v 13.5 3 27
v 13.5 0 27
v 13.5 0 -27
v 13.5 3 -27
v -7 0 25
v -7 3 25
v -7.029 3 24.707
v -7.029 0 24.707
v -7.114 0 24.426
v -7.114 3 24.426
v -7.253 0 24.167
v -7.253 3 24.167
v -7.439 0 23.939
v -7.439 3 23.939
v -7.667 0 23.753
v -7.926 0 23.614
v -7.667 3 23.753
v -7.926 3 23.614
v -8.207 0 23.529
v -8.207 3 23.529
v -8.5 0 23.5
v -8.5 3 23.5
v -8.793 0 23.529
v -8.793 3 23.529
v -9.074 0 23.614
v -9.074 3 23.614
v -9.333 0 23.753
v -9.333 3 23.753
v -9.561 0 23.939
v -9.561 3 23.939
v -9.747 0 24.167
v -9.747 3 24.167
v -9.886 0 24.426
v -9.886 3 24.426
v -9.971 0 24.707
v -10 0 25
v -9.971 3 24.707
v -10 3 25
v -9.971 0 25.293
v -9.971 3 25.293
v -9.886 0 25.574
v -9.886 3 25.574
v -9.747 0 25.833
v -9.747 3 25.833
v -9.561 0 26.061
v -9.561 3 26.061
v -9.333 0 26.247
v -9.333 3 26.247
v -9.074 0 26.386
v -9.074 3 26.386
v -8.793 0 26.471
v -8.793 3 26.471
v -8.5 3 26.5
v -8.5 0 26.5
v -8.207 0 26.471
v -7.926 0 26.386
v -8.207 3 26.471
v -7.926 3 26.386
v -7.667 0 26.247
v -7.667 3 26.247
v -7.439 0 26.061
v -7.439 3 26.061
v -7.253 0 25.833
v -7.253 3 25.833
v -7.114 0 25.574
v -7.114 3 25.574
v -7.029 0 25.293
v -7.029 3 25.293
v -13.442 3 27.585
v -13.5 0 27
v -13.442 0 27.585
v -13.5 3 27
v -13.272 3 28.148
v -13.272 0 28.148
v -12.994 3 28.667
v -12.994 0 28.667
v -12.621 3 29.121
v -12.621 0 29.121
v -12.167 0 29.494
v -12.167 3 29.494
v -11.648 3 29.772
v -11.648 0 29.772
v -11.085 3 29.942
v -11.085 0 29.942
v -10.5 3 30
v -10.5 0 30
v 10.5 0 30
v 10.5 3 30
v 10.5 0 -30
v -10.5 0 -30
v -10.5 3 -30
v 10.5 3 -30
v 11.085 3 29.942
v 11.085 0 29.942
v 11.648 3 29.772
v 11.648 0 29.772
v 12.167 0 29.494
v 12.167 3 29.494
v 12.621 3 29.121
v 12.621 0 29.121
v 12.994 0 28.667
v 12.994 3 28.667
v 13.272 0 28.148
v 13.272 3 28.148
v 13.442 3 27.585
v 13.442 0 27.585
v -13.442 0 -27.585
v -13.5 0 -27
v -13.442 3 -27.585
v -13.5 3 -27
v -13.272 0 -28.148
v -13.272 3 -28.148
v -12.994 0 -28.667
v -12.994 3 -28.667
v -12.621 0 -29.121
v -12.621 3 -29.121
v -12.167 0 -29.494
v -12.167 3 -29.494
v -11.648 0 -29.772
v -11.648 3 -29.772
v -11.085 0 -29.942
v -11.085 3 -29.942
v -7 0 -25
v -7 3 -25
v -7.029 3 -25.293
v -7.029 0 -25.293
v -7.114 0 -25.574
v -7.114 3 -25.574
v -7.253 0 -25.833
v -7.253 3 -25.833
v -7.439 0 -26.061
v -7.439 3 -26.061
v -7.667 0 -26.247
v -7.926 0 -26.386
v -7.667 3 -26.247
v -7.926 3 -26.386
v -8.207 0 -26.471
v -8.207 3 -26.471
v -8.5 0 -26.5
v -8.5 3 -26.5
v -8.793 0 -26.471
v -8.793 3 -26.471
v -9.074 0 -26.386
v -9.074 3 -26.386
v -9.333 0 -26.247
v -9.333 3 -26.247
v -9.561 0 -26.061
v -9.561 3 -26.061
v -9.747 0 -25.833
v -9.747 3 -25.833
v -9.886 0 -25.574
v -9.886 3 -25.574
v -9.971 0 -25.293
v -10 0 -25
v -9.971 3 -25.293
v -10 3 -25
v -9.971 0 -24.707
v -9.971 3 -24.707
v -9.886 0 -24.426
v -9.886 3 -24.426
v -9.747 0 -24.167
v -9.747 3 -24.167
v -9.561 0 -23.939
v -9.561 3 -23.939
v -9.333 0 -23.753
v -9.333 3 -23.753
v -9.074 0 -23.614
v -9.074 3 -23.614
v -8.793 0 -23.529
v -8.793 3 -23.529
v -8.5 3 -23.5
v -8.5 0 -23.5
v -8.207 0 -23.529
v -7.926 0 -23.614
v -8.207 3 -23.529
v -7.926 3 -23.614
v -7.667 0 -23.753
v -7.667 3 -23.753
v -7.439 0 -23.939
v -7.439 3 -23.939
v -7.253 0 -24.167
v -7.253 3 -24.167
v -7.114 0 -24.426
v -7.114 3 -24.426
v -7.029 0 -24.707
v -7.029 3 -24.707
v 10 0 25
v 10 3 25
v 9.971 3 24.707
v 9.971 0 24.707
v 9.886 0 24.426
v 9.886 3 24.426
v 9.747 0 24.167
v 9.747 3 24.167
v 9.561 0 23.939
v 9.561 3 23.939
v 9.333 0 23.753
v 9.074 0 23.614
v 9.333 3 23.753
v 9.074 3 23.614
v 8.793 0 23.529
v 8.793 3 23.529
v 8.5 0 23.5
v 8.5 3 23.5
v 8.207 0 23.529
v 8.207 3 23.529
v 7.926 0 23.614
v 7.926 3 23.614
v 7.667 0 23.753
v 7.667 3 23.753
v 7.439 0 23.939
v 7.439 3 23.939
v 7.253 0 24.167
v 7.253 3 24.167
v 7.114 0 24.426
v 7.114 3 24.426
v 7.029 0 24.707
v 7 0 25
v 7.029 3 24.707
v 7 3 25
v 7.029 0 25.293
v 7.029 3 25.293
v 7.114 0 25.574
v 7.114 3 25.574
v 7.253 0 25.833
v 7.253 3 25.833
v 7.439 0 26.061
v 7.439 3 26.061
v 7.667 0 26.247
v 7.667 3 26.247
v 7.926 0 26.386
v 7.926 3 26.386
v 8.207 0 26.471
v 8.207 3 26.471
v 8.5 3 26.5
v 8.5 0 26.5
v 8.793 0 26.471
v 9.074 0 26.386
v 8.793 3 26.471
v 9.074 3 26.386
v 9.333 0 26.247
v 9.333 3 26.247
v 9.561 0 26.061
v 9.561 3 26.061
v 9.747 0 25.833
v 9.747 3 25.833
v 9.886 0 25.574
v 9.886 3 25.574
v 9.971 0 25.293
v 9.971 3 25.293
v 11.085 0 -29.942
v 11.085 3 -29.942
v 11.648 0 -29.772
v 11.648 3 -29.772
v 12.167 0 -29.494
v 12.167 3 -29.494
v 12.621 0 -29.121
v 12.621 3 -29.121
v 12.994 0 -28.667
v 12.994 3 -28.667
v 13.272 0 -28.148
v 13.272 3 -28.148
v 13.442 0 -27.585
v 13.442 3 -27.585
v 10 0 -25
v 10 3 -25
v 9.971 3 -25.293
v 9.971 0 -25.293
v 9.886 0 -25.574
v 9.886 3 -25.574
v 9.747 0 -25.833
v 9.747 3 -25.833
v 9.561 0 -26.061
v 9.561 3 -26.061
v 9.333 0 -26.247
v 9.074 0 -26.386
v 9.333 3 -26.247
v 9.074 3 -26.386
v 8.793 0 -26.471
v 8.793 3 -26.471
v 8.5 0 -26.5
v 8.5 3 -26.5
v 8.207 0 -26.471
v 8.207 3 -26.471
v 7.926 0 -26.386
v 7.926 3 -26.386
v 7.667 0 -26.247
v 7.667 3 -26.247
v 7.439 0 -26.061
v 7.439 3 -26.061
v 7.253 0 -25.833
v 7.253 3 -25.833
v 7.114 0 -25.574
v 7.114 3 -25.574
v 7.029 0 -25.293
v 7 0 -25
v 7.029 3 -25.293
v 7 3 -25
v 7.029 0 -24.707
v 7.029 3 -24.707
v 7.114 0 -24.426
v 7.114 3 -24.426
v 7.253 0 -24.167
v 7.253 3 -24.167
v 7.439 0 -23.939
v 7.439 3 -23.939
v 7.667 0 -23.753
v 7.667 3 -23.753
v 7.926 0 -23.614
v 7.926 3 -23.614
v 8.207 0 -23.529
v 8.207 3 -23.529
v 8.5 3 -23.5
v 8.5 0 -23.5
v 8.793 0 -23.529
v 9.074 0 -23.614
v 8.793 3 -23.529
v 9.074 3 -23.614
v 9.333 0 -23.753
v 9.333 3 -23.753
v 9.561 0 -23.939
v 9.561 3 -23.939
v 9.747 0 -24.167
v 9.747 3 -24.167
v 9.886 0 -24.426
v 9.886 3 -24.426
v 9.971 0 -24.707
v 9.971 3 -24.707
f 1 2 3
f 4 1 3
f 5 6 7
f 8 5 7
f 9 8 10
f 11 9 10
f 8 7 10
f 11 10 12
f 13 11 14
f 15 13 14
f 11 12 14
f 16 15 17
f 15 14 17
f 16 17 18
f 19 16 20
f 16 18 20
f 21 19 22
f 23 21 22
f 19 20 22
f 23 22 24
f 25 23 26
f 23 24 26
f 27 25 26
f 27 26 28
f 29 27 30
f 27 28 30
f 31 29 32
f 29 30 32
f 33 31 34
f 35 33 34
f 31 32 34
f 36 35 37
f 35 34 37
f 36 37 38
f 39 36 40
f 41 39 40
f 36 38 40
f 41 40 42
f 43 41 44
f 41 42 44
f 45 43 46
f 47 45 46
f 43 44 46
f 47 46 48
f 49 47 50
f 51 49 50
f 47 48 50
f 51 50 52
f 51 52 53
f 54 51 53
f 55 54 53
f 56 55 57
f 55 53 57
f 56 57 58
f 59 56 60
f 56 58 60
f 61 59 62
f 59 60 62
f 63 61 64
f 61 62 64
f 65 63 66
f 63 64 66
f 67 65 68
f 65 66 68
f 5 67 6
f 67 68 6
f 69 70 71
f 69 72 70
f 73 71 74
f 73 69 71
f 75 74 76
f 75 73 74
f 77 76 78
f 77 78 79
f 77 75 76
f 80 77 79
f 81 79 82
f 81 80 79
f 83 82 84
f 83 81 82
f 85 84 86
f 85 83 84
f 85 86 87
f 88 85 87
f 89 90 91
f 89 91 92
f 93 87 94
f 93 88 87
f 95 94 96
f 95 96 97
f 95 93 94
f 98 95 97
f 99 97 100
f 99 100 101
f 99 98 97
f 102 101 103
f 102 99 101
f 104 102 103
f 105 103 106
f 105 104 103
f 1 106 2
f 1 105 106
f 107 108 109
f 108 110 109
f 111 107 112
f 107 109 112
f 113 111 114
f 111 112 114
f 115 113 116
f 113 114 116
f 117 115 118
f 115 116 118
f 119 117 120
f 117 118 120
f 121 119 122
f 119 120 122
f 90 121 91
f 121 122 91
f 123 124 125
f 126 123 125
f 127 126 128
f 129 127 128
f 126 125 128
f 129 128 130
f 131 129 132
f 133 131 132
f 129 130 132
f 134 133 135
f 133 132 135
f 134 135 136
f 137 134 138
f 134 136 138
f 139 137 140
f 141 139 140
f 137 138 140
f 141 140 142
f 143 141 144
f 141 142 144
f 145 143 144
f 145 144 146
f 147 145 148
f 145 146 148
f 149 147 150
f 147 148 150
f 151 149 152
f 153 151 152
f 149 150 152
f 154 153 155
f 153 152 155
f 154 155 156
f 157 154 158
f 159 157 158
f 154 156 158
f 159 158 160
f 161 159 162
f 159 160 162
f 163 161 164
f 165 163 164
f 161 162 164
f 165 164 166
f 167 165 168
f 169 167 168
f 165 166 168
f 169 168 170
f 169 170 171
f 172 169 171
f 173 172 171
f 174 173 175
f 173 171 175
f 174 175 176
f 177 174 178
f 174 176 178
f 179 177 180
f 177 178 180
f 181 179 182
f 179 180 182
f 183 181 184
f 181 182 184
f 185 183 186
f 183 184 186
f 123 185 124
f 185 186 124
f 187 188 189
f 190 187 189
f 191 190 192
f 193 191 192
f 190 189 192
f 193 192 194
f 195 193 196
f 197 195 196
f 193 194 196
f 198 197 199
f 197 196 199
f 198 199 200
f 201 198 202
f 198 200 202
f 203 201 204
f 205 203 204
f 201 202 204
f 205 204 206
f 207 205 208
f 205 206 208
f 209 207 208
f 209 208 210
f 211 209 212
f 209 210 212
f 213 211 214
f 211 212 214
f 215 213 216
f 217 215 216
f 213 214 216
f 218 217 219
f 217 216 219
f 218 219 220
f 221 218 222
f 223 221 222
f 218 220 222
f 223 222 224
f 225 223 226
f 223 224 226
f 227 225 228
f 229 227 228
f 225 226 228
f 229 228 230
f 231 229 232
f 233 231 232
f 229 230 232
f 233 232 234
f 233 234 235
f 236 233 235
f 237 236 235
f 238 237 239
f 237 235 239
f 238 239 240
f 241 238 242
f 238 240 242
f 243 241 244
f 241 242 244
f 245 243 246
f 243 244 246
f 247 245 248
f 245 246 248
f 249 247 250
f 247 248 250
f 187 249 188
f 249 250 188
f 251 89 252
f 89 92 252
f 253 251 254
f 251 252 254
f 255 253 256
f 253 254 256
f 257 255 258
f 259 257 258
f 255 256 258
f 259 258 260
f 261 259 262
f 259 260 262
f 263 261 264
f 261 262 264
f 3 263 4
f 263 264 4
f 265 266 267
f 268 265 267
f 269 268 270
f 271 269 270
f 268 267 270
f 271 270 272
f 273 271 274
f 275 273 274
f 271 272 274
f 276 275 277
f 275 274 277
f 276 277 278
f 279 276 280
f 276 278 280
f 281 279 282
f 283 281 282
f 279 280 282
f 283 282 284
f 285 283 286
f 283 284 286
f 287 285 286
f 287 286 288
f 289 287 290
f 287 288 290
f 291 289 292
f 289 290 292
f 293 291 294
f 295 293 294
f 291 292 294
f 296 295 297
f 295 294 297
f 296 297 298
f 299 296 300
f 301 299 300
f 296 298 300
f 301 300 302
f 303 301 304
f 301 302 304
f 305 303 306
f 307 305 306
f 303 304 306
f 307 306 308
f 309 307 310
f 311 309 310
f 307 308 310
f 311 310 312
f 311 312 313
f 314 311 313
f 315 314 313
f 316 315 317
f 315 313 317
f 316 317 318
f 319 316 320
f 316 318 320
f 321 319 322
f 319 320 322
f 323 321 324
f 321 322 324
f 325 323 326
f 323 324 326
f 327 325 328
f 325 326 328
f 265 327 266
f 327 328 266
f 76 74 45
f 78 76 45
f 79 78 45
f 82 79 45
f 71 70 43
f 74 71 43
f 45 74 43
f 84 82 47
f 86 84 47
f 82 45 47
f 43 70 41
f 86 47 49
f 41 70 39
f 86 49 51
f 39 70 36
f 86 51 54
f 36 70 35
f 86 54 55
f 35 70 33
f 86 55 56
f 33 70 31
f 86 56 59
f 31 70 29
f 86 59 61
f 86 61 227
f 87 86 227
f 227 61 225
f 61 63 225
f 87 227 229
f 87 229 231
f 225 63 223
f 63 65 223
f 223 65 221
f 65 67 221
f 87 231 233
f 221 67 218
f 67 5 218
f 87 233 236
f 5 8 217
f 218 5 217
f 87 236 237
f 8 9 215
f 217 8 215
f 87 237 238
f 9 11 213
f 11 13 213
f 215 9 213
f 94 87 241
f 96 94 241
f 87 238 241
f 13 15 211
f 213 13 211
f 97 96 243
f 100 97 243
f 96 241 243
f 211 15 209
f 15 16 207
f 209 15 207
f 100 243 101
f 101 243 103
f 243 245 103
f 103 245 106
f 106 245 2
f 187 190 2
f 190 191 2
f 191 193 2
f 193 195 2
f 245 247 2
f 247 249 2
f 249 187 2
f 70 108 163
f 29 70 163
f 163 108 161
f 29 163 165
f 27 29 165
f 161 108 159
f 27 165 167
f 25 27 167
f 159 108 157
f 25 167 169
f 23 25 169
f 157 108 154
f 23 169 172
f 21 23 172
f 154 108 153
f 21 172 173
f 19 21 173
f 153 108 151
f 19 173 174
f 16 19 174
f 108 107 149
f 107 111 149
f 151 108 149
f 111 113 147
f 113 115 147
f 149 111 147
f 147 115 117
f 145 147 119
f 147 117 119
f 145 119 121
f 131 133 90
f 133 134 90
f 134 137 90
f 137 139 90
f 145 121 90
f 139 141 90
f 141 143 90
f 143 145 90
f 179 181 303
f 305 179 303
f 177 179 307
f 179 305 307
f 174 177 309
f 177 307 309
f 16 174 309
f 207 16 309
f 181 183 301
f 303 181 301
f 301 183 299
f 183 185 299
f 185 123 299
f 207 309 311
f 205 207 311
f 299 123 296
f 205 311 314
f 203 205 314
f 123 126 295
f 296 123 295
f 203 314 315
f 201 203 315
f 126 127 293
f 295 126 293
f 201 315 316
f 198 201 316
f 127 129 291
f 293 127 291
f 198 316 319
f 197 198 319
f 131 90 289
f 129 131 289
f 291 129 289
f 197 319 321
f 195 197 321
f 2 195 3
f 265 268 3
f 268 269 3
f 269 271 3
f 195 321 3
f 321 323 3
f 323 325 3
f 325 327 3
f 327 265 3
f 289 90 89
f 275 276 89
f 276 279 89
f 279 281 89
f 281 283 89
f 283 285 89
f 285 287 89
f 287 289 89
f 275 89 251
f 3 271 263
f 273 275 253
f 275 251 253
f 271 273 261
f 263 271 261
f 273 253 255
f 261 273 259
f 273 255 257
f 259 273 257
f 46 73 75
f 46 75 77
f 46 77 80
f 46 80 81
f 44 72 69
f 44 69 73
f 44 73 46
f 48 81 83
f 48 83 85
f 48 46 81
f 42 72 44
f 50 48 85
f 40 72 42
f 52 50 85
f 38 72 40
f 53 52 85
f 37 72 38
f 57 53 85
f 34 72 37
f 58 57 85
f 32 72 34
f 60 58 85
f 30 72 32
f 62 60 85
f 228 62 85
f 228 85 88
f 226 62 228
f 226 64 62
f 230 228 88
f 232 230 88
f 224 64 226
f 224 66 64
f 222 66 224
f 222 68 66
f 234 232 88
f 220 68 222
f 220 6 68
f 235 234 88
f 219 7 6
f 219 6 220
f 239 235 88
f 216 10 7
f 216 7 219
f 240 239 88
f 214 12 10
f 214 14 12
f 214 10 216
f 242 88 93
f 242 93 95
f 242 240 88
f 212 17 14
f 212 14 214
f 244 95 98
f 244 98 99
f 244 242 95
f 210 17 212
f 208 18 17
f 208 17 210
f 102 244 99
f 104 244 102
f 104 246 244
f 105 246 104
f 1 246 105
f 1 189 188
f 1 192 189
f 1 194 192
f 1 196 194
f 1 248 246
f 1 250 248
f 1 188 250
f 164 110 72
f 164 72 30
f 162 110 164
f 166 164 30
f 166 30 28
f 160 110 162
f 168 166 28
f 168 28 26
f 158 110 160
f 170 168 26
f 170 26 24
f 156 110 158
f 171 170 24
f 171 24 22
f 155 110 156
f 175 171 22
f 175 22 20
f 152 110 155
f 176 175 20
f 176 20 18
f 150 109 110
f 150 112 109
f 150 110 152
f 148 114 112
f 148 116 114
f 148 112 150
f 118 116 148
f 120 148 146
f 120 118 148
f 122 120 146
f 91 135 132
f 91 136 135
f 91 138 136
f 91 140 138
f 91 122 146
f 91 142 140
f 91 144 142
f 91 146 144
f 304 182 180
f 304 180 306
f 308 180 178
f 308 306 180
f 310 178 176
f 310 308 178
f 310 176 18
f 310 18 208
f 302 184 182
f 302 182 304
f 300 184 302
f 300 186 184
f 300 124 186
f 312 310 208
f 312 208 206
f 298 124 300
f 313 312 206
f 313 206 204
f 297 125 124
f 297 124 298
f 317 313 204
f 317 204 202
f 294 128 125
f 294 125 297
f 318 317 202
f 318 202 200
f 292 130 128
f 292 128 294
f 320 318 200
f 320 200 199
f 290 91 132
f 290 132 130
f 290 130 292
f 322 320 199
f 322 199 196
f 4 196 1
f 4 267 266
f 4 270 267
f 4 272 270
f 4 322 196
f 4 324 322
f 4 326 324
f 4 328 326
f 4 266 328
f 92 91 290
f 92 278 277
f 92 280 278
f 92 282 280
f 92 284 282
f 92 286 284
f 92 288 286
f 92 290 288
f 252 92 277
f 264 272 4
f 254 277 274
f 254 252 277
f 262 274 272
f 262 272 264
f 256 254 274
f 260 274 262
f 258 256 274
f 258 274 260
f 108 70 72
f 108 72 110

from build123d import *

# Parameters (mm, degrees)
SKETCH3_W           = 27
SKETCH3_H           = 60
BOSS_EXTRUDE1_DEPTH = 3
SKETCH4_R           = 1.5
CUT_EXTRUDE1_DEPTH  = 3
FILLET2_R           = 3
FILLET3_R           = 3


with BuildPart() as part:
    # Sketch3 → Boss-Extrude1 (new body)
    with BuildSketch(Plane(origin=(0, 0, 0), x_dir=(1, 0, 0), z_dir=(0, 1, 0))):
        Rectangle(SKETCH3_W, SKETCH3_H)
    extrude(amount=BOSS_EXTRUDE1_DEPTH)

    # Sketch4 → Cut-Extrude1 (cut)
    with BuildSketch(Plane(origin=(0, 3, 0), x_dir=(1, 0, 0), z_dir=(0, 1, 0))):
        with Locations((-8.5, 25)):
            Circle(SKETCH4_R)
        with Locations((8.5, 25)):
            Circle(SKETCH4_R)
        with Locations((8.5, -25)):
            Circle(SKETCH4_R)
        with Locations((-8.5, -25)):
            Circle(SKETCH4_R)
    extrude(amount=-CUT_EXTRUDE1_DEPTH, mode=Mode.SUBTRACT)

    # Fillet2
    fillet2_edges = [part.edges().sort_by_distance(p)[0] for p in [
        (-13.5, 1.5, 30),
    ]]
    fillet(fillet2_edges, radius=FILLET2_R)

    # Fillet3
    fillet3_edges = [part.edges().sort_by_distance(p)[0] for p in [
        (-13.5, 1.5, -30),
        (13.5, 1.5, -30),
        (13.5, 1.5, 30),
    ]]
    fillet(fillet3_edges, radius=FILLET3_R)


solid = part.part
